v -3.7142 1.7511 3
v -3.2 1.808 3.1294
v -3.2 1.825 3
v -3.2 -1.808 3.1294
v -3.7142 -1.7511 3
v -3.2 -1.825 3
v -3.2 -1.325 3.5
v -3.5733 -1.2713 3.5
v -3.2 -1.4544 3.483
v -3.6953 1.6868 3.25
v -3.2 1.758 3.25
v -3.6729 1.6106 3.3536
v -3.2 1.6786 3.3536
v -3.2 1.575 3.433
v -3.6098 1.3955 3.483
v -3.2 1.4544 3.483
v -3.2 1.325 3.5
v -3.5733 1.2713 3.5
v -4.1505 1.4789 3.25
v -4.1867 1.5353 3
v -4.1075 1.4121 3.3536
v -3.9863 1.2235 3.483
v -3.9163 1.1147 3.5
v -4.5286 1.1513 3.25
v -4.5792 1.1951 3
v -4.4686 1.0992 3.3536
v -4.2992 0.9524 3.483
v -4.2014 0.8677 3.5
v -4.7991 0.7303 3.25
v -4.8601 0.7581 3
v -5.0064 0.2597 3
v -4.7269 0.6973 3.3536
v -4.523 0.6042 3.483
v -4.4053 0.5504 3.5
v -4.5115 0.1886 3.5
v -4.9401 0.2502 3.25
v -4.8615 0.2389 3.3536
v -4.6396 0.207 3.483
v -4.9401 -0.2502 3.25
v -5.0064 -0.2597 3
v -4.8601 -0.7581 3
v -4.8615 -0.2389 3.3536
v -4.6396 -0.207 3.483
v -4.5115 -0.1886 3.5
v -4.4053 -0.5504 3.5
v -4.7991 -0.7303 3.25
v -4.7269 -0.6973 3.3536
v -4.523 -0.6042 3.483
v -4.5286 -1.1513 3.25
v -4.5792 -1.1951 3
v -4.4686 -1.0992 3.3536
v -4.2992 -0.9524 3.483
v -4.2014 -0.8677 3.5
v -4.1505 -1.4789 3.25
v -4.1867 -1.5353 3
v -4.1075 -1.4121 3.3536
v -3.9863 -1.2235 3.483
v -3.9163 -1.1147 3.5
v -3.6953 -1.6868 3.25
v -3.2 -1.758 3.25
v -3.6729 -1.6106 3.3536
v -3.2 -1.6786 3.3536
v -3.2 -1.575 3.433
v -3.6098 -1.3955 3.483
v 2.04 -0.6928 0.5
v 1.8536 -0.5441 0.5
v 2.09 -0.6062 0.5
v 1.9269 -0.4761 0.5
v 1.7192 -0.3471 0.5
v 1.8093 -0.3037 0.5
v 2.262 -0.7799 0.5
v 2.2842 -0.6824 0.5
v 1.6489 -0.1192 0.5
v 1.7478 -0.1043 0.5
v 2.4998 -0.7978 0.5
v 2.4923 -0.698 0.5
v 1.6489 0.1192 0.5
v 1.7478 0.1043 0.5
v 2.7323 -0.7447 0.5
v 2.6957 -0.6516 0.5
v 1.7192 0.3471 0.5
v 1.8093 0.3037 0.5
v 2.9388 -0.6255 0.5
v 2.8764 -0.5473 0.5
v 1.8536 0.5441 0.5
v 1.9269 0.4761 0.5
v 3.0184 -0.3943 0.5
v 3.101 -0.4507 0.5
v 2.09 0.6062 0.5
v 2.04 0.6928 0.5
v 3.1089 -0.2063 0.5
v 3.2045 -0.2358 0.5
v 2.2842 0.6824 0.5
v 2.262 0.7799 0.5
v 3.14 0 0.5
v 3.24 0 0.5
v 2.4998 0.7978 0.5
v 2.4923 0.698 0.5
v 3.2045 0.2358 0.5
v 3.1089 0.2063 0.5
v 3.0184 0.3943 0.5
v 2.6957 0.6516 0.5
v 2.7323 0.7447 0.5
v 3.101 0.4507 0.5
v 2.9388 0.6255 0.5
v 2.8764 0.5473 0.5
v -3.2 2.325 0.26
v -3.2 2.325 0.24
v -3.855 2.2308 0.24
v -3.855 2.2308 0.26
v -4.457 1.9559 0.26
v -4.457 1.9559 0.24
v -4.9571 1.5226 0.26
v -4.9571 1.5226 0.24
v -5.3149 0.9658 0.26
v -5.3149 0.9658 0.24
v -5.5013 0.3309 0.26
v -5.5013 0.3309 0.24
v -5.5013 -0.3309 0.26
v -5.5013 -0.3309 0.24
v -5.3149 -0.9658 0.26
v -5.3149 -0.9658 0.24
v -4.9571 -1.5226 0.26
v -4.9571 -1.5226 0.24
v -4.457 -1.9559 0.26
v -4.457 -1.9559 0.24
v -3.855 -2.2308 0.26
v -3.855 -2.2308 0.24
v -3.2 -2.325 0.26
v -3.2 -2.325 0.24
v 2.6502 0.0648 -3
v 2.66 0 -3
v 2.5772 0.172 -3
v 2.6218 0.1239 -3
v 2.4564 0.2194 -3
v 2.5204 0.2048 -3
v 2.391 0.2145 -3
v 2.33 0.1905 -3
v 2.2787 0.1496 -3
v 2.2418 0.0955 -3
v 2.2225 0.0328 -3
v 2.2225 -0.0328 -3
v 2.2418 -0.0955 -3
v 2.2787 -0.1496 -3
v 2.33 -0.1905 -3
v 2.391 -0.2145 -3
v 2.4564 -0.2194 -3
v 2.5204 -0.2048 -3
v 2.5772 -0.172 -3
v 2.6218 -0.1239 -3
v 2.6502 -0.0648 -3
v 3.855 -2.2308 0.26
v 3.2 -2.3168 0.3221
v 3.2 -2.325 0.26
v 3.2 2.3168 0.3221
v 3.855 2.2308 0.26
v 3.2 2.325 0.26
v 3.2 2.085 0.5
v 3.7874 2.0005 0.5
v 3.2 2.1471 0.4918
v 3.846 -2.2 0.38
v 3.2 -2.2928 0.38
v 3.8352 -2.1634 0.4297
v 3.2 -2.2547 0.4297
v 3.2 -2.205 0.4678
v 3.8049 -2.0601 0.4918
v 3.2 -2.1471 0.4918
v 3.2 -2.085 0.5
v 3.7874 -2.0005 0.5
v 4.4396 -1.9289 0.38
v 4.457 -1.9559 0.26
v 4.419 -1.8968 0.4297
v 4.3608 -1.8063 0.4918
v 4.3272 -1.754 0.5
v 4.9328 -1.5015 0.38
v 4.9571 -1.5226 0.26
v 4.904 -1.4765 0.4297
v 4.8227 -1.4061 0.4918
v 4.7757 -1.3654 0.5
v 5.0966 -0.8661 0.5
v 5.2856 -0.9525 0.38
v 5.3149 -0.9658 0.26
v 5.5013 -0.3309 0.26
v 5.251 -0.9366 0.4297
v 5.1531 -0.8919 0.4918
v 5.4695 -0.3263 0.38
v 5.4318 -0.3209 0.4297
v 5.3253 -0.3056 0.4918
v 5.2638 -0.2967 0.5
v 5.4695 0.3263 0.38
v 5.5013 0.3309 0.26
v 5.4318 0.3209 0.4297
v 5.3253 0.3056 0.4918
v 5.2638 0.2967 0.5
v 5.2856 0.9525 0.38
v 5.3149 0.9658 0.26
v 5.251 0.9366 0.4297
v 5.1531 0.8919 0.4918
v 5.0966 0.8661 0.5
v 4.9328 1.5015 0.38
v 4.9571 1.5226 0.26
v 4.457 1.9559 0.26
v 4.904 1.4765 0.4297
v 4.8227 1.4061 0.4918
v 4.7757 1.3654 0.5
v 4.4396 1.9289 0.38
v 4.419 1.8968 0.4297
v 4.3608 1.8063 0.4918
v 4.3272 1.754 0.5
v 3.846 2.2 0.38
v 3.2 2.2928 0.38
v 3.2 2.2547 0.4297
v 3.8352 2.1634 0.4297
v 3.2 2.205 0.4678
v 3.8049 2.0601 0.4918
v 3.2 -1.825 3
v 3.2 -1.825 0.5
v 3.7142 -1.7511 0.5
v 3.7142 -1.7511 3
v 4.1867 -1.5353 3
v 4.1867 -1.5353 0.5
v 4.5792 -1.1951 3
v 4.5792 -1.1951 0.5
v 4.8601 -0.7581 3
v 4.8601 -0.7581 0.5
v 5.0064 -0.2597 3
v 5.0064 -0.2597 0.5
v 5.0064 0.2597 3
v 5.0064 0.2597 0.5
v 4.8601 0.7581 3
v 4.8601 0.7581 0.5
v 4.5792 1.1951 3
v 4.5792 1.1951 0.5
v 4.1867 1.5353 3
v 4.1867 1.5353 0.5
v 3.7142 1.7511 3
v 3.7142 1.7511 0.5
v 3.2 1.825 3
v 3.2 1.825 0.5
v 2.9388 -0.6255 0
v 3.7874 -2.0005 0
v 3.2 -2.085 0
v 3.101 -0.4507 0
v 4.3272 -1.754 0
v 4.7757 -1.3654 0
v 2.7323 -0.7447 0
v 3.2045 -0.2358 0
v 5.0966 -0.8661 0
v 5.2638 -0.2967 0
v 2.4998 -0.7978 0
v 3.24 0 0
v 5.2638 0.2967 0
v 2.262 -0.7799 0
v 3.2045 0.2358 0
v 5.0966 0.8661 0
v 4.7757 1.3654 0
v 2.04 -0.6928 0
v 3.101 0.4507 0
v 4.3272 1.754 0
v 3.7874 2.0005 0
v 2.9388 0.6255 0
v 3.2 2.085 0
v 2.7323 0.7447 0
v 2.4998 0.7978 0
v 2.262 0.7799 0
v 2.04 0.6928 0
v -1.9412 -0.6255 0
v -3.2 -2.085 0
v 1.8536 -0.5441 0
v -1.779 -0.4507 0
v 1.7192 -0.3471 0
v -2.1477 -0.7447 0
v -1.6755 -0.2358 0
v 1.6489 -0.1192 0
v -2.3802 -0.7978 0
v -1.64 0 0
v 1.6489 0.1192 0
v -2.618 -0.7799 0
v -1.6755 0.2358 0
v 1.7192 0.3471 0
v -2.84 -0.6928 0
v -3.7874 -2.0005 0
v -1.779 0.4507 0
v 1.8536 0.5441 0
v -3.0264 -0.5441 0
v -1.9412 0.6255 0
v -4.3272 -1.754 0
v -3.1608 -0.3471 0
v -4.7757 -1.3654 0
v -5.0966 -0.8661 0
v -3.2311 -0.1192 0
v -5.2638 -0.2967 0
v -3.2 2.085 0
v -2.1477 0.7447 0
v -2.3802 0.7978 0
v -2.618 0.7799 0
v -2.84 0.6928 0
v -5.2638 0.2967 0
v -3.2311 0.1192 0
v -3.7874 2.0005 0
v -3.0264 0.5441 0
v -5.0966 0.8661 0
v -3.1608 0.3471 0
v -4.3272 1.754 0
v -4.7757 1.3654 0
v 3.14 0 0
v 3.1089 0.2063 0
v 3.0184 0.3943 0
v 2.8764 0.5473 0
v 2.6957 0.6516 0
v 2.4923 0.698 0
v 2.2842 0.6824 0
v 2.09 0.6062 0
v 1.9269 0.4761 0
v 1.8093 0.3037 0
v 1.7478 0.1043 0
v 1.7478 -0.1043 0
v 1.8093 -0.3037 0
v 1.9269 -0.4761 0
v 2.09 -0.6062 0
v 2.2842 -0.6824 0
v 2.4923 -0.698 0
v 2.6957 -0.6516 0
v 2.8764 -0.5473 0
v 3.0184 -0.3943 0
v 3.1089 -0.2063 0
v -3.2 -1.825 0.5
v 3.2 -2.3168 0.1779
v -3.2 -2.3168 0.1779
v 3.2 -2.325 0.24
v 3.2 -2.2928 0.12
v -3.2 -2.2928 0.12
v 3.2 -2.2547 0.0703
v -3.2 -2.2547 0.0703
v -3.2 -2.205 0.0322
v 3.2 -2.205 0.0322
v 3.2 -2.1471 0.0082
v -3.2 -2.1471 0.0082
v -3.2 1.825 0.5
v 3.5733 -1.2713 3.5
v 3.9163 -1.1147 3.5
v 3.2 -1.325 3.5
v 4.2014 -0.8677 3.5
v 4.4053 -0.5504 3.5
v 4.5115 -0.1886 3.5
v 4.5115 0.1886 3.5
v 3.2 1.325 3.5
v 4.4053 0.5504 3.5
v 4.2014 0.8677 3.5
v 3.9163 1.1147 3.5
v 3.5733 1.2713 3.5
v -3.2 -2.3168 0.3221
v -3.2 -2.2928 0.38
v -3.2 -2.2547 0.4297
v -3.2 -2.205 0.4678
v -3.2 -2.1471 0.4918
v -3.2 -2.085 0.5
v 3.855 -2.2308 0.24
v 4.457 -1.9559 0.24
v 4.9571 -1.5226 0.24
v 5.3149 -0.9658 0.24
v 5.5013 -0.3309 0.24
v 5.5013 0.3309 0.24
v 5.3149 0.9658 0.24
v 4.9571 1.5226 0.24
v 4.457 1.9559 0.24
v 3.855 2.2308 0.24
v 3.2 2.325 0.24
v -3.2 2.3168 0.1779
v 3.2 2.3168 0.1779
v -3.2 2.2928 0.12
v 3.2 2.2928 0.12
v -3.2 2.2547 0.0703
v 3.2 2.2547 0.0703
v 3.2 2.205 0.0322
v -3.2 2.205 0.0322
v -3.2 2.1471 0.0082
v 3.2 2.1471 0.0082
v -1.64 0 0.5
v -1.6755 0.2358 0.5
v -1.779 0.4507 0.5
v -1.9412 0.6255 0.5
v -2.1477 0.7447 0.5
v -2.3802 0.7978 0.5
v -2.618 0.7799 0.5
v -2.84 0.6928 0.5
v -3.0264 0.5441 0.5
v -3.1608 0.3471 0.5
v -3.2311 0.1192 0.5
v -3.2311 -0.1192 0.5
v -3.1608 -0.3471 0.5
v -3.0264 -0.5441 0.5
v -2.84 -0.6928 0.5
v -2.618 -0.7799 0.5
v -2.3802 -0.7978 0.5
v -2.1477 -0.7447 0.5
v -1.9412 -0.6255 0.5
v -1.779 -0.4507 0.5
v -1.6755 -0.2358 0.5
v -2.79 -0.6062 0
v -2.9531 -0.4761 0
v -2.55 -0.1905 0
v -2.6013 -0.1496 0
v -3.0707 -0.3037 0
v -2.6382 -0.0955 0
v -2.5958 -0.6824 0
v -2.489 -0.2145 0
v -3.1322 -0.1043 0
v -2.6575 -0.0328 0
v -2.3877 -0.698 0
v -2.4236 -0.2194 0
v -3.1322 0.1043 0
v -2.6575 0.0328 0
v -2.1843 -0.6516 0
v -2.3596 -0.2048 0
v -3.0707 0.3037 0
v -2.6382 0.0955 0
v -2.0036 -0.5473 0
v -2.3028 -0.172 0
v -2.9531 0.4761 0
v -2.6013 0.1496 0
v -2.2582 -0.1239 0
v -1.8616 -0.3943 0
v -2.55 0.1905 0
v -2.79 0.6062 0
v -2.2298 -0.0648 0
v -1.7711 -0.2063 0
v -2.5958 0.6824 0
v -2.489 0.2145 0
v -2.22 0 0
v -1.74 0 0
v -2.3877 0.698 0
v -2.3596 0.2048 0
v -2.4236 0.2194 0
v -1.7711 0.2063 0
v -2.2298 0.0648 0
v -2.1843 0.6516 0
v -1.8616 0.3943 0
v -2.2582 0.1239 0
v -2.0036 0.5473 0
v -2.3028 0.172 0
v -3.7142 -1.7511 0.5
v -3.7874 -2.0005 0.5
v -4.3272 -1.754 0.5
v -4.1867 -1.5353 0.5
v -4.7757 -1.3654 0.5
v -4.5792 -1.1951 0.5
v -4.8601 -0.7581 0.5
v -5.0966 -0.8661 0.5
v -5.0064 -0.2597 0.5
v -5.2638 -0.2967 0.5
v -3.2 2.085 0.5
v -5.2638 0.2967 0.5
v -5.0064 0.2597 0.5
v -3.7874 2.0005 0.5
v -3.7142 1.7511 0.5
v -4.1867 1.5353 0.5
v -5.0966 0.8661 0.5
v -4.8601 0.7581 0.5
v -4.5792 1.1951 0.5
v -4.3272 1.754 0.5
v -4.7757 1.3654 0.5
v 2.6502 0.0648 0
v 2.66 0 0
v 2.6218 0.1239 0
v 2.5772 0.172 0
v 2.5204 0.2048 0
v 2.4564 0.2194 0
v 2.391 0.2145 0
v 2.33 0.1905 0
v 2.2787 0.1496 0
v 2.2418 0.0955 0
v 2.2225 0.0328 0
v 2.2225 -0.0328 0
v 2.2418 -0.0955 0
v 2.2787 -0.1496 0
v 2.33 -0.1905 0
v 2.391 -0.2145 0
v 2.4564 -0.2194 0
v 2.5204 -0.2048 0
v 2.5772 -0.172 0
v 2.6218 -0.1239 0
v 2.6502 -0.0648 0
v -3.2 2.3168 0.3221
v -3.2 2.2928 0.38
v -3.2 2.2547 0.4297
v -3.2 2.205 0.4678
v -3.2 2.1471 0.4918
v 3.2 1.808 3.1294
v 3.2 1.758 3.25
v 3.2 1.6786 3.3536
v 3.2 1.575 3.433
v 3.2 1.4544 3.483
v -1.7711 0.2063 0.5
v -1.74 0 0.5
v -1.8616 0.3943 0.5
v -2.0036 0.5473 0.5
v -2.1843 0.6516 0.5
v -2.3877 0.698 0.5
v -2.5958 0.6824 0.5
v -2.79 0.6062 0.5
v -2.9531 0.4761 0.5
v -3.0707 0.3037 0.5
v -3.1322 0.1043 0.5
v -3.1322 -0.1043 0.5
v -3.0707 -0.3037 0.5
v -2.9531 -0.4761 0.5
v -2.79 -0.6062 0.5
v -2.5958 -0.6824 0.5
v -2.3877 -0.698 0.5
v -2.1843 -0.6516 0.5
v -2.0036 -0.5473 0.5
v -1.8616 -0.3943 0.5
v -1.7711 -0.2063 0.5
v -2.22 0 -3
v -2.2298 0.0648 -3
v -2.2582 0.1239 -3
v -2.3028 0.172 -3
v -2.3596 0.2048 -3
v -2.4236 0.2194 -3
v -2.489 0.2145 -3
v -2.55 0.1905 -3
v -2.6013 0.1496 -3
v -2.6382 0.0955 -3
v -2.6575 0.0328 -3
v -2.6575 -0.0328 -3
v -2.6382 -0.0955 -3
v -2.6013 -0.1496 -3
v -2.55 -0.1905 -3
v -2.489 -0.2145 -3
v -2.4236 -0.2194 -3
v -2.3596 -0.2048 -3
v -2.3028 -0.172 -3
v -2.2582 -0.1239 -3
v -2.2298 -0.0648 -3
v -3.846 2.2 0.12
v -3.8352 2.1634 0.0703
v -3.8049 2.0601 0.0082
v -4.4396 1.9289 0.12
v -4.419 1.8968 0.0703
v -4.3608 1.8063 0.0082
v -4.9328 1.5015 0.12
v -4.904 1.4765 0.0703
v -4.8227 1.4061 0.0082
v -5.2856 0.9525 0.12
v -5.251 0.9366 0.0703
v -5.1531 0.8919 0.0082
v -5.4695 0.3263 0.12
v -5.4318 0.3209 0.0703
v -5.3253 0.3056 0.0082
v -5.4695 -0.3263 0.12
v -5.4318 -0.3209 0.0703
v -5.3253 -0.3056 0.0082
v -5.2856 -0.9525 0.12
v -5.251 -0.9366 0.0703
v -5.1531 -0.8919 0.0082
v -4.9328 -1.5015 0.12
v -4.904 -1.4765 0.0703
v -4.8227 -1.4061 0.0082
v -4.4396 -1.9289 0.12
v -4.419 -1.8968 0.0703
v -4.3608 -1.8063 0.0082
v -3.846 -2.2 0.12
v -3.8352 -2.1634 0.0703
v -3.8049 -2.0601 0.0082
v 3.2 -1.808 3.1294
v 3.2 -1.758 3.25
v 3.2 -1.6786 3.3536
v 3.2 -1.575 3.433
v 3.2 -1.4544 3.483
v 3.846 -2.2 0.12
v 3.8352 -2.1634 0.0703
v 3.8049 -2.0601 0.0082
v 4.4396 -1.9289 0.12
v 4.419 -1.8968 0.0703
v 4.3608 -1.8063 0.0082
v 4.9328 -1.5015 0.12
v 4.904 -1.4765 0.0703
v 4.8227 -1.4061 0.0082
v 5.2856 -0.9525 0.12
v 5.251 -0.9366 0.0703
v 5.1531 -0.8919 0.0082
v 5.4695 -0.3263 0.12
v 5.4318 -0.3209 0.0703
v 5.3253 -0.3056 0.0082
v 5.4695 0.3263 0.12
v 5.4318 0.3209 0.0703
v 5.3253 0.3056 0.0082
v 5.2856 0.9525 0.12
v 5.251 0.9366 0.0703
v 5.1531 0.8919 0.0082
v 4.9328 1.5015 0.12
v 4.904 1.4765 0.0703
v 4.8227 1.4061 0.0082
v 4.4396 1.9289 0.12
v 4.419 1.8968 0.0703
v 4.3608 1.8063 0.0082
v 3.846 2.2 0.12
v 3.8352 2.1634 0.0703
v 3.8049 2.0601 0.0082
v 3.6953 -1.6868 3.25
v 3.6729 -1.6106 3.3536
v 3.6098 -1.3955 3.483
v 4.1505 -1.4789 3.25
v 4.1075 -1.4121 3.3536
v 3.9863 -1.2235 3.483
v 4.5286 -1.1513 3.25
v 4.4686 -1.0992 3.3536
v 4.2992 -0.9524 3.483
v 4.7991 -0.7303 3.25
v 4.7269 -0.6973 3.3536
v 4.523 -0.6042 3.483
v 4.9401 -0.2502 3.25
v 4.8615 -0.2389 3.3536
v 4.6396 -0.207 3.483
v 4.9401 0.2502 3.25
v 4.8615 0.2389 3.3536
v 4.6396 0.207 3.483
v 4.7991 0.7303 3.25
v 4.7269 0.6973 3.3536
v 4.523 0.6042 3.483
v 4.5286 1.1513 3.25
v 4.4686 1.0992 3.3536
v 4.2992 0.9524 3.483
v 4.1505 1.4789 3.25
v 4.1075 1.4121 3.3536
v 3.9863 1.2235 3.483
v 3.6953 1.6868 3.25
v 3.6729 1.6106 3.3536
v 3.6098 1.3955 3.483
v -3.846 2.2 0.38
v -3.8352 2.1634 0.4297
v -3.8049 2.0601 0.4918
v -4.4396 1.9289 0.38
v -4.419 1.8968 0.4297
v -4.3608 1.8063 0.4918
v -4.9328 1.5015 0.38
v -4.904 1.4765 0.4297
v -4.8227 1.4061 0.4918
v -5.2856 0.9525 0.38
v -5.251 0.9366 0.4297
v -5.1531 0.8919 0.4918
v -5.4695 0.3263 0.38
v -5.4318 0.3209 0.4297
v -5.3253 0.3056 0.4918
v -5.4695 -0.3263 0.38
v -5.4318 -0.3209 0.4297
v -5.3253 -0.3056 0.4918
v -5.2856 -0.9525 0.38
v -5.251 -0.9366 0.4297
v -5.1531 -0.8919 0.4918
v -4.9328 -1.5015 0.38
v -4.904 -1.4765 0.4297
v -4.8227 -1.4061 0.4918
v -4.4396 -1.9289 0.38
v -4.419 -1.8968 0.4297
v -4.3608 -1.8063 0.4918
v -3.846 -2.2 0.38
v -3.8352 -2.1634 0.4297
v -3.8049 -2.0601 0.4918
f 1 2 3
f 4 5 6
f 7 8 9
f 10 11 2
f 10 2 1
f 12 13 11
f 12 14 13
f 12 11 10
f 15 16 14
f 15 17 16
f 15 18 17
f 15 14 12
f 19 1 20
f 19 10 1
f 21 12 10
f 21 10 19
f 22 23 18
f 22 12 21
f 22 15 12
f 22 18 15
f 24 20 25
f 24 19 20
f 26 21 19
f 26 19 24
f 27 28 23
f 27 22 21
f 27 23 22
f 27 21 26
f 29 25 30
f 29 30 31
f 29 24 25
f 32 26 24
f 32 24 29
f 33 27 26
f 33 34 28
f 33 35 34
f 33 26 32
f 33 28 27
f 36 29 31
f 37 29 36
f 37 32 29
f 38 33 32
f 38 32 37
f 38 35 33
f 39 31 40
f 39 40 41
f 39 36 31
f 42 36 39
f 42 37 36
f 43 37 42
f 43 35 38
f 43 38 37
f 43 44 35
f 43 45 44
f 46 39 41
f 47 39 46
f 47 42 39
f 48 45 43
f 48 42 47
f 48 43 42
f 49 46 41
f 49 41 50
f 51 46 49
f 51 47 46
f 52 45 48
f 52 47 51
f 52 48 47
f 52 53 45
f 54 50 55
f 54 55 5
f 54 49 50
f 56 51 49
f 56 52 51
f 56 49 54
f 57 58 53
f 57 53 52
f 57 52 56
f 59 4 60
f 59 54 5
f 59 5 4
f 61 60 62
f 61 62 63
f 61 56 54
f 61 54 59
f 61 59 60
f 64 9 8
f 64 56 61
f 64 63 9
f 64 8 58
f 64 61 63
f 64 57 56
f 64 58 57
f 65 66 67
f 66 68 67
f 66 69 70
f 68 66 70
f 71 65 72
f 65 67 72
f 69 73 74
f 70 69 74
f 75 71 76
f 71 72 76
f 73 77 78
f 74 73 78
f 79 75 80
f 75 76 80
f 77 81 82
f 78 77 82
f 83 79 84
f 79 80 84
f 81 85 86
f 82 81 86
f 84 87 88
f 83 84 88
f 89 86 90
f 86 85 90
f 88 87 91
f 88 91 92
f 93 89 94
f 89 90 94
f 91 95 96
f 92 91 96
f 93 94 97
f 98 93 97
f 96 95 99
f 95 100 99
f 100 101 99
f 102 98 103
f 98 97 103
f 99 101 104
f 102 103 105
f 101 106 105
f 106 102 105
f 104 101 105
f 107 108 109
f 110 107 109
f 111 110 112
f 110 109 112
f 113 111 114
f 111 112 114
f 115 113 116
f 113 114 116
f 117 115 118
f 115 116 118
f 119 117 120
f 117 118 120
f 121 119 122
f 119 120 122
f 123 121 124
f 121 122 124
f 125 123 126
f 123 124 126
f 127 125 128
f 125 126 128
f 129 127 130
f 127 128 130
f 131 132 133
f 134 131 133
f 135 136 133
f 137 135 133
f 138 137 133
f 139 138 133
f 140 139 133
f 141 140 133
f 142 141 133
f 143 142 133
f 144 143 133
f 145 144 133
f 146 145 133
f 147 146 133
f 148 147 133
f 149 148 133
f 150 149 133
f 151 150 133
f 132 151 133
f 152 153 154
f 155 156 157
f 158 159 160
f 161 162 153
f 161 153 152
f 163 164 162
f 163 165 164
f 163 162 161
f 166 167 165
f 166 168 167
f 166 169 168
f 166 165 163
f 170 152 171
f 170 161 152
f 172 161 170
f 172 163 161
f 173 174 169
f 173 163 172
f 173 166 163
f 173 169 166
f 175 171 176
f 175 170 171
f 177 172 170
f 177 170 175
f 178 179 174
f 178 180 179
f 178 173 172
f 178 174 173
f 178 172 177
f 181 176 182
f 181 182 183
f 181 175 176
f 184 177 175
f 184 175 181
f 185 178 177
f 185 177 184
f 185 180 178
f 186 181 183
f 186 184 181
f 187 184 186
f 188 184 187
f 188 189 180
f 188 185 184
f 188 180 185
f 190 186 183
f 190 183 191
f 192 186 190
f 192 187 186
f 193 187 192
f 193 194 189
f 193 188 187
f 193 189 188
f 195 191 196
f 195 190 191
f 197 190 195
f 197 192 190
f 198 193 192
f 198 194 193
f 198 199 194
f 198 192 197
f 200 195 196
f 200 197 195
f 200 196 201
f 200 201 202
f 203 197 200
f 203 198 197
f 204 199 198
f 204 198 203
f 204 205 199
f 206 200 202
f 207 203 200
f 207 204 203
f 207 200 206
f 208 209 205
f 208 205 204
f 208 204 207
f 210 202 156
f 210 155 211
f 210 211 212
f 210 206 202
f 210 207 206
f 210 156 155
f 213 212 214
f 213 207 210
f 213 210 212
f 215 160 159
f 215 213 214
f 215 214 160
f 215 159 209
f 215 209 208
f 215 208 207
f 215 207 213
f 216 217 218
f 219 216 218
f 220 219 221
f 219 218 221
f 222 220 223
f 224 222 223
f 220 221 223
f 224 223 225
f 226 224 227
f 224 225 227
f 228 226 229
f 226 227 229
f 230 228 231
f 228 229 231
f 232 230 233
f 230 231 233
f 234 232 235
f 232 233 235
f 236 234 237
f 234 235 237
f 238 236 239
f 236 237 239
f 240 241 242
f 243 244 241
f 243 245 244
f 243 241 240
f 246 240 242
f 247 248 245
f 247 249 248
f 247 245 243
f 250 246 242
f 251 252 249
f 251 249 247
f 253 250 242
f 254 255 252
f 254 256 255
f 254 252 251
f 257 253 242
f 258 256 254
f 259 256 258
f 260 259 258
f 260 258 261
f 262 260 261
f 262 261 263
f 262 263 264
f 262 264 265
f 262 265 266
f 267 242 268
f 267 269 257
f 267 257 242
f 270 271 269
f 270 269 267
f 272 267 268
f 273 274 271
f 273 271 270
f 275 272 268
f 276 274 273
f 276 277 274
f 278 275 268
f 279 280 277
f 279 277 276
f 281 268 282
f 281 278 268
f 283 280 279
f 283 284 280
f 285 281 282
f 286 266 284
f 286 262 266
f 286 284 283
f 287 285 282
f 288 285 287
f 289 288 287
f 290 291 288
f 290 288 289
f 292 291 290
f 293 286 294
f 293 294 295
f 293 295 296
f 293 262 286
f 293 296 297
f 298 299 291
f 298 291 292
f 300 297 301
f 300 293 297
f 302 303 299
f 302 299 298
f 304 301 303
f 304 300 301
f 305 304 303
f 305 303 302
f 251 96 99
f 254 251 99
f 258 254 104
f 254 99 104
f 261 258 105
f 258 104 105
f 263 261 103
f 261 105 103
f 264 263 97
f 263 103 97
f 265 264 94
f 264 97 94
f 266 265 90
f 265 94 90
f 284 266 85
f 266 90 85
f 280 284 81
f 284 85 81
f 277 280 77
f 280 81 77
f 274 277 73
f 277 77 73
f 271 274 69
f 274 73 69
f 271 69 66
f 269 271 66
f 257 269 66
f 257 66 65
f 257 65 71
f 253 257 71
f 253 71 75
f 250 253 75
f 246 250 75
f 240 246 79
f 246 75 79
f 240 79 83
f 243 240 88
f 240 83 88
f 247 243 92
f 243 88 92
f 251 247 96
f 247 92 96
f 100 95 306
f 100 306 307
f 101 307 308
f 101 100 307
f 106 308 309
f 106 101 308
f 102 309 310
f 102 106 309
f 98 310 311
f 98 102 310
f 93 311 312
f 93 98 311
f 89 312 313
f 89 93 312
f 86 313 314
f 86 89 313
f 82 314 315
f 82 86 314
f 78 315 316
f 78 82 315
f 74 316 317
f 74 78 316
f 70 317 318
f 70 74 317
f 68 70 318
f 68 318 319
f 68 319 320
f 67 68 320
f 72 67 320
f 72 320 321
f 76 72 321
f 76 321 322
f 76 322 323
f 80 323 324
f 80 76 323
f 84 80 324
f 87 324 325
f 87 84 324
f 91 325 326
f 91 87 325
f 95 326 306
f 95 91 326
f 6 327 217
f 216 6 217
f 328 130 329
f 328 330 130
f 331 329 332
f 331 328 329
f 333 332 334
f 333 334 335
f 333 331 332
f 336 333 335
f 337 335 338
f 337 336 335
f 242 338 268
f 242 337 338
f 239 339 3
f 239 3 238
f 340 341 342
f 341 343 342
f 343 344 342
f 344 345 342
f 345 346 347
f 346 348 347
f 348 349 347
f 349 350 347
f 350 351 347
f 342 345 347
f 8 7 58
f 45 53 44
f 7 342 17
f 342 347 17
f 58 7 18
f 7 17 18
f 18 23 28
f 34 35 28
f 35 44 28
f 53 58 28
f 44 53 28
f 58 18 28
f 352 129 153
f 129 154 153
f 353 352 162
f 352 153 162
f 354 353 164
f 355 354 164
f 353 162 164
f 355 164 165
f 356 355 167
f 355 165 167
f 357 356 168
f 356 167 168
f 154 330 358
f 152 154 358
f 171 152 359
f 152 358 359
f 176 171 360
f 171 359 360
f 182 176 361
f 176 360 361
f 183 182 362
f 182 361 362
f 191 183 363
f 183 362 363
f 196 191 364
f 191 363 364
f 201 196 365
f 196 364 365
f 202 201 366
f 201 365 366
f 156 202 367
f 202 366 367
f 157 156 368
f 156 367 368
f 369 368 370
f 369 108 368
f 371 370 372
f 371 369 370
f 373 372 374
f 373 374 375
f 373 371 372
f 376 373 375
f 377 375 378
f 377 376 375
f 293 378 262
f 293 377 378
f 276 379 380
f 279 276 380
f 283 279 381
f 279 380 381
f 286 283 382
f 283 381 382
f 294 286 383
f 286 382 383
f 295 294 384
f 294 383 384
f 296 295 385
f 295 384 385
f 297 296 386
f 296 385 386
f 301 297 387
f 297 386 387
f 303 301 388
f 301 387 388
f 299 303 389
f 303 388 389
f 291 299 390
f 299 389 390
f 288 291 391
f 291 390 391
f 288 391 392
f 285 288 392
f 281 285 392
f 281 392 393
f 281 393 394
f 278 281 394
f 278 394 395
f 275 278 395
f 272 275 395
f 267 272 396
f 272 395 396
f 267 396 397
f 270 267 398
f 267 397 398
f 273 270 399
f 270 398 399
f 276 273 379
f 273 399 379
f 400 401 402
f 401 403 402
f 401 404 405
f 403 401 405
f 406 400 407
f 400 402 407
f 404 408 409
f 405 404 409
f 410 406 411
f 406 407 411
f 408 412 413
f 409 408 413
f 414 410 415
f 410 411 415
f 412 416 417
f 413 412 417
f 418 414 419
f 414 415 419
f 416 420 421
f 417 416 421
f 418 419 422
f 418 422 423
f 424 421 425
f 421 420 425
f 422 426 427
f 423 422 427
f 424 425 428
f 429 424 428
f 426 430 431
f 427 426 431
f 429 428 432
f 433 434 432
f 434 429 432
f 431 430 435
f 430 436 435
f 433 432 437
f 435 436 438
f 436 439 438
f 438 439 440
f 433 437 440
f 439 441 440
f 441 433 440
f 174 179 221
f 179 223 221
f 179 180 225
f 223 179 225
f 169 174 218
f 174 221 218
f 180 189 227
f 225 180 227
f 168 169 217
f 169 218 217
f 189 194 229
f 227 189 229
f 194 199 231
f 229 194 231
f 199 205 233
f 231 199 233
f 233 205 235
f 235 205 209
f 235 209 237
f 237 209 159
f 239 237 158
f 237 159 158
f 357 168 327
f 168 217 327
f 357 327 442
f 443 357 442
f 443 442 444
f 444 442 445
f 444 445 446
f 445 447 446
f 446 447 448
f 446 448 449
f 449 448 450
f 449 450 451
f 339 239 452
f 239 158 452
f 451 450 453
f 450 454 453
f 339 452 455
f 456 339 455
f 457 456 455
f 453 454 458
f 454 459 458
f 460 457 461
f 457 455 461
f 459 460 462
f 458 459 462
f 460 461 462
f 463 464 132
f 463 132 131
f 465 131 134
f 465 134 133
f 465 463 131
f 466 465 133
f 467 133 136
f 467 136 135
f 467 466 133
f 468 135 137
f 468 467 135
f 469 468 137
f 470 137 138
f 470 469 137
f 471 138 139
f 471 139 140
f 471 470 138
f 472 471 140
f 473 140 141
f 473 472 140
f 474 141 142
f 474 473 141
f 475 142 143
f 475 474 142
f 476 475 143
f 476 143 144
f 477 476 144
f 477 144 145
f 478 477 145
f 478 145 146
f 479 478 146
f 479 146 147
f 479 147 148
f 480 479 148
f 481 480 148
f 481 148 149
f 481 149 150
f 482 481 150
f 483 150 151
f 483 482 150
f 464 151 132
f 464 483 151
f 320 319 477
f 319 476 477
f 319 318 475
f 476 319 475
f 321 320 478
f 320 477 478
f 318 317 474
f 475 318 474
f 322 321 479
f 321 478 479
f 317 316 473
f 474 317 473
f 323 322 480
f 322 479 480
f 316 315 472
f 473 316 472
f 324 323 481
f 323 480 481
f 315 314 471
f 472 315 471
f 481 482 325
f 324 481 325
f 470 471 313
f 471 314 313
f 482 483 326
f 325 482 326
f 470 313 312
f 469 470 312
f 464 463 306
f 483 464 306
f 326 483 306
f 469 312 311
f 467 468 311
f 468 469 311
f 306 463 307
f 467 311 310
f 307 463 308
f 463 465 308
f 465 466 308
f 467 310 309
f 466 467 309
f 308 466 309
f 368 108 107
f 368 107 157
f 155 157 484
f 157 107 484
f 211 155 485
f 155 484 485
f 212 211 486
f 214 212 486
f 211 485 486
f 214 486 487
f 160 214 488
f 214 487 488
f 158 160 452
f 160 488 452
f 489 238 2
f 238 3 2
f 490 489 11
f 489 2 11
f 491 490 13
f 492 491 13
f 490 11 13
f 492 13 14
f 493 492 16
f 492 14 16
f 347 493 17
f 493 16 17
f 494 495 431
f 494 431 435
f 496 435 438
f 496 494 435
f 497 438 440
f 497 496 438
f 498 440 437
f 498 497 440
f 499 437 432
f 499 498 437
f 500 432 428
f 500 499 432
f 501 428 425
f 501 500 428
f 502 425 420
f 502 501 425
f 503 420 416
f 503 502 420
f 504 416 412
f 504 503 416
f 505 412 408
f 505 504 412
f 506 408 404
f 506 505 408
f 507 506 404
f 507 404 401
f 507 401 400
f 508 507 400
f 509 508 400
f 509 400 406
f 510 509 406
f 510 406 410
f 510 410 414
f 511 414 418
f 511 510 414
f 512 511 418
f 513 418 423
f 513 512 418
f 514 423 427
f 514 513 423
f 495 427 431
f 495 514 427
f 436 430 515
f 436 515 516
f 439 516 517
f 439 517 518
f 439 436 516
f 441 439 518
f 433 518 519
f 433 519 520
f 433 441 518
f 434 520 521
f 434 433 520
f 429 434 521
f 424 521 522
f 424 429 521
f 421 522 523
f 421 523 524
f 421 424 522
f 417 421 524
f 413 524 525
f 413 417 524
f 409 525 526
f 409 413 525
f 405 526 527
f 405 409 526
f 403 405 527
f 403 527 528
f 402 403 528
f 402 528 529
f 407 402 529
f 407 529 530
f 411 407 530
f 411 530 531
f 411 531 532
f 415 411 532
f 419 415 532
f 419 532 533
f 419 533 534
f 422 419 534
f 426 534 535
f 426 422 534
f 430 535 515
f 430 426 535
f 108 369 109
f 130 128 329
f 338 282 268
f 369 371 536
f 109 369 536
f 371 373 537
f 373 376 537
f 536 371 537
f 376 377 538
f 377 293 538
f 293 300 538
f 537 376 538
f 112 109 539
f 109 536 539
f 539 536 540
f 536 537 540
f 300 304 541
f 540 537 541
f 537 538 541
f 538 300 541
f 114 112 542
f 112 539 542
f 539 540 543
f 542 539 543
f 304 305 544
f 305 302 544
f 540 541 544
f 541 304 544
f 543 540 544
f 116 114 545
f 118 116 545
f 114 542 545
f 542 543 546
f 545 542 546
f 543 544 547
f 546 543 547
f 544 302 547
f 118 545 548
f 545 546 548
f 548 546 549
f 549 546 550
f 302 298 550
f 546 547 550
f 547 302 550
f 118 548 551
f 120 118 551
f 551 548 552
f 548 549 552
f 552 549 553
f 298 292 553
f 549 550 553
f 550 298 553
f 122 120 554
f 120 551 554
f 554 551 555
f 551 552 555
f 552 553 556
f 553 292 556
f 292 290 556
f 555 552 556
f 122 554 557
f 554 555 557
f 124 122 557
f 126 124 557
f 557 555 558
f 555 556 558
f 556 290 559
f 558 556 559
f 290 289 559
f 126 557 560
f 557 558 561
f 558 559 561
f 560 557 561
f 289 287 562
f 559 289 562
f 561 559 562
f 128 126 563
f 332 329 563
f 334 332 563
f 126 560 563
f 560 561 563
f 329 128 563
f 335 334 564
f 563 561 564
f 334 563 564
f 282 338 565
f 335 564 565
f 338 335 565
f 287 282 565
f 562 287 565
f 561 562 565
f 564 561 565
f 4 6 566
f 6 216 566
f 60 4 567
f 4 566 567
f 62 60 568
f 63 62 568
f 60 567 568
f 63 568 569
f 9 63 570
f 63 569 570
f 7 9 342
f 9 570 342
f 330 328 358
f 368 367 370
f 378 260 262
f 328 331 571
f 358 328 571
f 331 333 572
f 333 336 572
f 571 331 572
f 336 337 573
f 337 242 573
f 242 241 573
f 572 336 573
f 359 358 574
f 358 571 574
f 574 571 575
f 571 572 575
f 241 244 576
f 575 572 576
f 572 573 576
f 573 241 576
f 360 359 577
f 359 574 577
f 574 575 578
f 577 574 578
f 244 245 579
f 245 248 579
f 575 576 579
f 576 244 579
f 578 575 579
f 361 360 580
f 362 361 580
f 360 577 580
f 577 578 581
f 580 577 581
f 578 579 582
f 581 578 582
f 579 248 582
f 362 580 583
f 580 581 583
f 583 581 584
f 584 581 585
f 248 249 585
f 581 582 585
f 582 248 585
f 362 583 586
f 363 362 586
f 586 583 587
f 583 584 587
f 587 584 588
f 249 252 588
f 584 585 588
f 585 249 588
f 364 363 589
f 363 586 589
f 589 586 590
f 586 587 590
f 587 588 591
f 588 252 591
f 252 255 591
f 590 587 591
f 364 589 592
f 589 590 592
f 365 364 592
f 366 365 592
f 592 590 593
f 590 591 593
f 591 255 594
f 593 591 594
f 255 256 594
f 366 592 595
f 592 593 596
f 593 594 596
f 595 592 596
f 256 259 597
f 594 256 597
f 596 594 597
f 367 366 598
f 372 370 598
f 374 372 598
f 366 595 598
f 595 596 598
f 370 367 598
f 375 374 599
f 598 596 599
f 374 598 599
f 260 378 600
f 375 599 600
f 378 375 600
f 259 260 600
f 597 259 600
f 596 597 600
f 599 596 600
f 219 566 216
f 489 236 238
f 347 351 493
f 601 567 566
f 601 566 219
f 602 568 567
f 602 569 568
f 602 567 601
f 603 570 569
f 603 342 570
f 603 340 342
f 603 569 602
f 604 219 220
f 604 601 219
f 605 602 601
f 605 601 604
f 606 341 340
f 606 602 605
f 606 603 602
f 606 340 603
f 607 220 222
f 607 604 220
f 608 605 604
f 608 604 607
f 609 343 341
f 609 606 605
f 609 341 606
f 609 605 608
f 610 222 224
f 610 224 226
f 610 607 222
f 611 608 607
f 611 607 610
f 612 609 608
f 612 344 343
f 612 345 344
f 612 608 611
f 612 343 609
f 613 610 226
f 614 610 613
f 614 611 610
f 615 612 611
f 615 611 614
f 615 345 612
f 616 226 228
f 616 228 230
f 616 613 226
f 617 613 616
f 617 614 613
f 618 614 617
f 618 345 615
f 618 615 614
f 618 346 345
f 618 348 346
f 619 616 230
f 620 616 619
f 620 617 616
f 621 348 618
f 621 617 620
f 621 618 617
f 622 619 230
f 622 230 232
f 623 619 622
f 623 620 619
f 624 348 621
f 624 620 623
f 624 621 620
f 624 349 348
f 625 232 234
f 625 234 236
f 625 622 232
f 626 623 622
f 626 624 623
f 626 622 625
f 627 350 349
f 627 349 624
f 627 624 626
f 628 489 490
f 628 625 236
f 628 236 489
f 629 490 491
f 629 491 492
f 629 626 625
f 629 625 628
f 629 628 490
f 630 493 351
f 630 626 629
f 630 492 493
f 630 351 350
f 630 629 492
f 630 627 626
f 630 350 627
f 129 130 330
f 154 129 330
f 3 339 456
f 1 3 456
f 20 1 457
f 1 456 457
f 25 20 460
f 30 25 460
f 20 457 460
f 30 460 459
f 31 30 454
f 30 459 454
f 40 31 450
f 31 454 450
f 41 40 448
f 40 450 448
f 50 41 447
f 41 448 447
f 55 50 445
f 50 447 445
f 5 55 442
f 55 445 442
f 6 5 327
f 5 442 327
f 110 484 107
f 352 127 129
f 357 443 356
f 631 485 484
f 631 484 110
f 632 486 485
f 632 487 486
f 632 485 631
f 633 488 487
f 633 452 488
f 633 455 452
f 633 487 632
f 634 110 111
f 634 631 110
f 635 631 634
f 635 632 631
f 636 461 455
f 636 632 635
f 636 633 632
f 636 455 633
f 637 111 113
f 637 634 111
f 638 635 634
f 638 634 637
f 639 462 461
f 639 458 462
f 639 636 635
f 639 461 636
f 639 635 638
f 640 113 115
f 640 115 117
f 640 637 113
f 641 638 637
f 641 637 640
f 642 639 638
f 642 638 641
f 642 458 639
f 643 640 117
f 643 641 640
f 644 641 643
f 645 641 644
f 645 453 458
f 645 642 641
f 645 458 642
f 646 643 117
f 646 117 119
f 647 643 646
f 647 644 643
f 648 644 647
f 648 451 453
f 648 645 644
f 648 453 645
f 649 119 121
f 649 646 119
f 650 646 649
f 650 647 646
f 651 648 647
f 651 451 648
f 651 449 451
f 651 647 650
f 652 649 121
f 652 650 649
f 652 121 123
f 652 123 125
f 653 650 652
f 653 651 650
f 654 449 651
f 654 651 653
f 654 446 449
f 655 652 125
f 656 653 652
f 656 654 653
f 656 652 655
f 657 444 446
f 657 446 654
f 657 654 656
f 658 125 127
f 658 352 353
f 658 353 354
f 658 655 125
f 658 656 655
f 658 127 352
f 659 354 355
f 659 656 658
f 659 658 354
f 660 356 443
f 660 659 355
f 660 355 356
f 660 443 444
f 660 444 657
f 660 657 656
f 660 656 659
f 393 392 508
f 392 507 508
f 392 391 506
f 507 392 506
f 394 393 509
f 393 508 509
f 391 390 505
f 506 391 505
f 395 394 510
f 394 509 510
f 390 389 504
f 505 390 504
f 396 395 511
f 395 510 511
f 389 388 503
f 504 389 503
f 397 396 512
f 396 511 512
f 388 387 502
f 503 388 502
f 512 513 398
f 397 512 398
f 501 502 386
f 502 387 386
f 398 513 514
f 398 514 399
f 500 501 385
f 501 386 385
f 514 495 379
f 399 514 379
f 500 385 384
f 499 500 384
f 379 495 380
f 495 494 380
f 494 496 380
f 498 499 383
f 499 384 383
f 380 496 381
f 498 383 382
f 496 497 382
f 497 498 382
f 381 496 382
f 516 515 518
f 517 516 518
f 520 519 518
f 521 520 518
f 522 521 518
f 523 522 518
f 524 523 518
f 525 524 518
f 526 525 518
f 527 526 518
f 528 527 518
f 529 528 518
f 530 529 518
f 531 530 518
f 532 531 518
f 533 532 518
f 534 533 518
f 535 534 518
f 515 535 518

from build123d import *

# Parameters (mm, degrees)
PAD_DEPTH    = 0.5
FILLET_R     = 0.24
PAD001_DEPTH = 3
FILLET001_R  = 0.5
SKETCH002_R  = 0.8
POCKET_DEPTH = 0.5
SKETCH003_R  = 0.7
PAD002_DEPTH = 0.5
SKETCH004_R  = 0.22
PAD003_DEPTH = 3


with BuildPart() as part:
    # Sketch → Pad (new body)
    with BuildSketch(Plane.XY):
        with BuildLine():
            Line((-3.2, 2.325), (3.2, 2.325))
            ThreePointArc((3.2, -2.325), (5.525, 0), (3.2, 2.325))
            Line((-3.2, -2.325), (3.2, -2.325))
            ThreePointArc((-3.2, 2.325), (-5.525, 0), (-3.2, -2.325))
        make_face()
    extrude(amount=PAD_DEPTH)

    # Fillet
    fillet_edges = [part.edges().sort_by_distance(p)[0] for p in [
        (0, -2.325, 0.5),
        (-5.525, 0, 0.5),
        (0, 2.325, 0.5),
        (5.525, 0, 0.5),
        (5.525, 0, 0),
        (0, -2.325, 0),
        (-5.525, 0, 0),
        (0, 2.325, 0),
    ]]
    fillet(fillet_edges, radius=FILLET_R)

    # Sketch001 (on DatumPlane) → Pad001 (join)
    with BuildSketch(Plane.XY.offset(0.5)):
        with BuildLine():
            Line((-3.2, 1.825), (3.2, 1.825))
            ThreePointArc((3.2, -1.825), (5.025, 0), (3.2, 1.825))
            Line((-3.2, -1.825), (3.2, -1.825))
            ThreePointArc((-3.2, 1.825), (-5.025, 0), (-3.2, -1.825))
        make_face()
    extrude(amount=PAD001_DEPTH)

    # Fillet001
    fillet001_edges = [part.edges().sort_by_distance(p)[0] for p in [
        (0, -1.825, 3.5),
        (-5.025, 0, 3.5),
        (0, 1.825, 3.5),
        (5.025, 0, 3.5),
    ]]
    fillet(fillet001_edges, radius=FILLET001_R)

    # Sketch002 (on DatumPlane) → Pocket (cut)
    with BuildSketch(Plane.XY.offset(0.5)):
        with Locations((-2.44, 0)):
            Circle(SKETCH002_R)
        with Locations((2.44, 0)):
            Circle(SKETCH002_R)
    extrude(amount=-POCKET_DEPTH, mode=Mode.SUBTRACT)

    # Sketch003 (on DatumPlane) → Pad002 (join)
    with BuildSketch(Plane.XY.offset(0.5)):
        with Locations((2.44, 0)):
            Circle(SKETCH003_R)
        with Locations((-2.44, 0)):
            Circle(SKETCH003_R)
    extrude(amount=-PAD002_DEPTH)

    # Sketch004 → Pad003 (join)
    with BuildSketch(Plane.XY):
        with Locations((2.44, 0)):
            Circle(SKETCH004_R)
        with Locations((-2.44, 0)):
            Circle(SKETCH004_R)
    extrude(amount=-PAD003_DEPTH)


solid = part.part
